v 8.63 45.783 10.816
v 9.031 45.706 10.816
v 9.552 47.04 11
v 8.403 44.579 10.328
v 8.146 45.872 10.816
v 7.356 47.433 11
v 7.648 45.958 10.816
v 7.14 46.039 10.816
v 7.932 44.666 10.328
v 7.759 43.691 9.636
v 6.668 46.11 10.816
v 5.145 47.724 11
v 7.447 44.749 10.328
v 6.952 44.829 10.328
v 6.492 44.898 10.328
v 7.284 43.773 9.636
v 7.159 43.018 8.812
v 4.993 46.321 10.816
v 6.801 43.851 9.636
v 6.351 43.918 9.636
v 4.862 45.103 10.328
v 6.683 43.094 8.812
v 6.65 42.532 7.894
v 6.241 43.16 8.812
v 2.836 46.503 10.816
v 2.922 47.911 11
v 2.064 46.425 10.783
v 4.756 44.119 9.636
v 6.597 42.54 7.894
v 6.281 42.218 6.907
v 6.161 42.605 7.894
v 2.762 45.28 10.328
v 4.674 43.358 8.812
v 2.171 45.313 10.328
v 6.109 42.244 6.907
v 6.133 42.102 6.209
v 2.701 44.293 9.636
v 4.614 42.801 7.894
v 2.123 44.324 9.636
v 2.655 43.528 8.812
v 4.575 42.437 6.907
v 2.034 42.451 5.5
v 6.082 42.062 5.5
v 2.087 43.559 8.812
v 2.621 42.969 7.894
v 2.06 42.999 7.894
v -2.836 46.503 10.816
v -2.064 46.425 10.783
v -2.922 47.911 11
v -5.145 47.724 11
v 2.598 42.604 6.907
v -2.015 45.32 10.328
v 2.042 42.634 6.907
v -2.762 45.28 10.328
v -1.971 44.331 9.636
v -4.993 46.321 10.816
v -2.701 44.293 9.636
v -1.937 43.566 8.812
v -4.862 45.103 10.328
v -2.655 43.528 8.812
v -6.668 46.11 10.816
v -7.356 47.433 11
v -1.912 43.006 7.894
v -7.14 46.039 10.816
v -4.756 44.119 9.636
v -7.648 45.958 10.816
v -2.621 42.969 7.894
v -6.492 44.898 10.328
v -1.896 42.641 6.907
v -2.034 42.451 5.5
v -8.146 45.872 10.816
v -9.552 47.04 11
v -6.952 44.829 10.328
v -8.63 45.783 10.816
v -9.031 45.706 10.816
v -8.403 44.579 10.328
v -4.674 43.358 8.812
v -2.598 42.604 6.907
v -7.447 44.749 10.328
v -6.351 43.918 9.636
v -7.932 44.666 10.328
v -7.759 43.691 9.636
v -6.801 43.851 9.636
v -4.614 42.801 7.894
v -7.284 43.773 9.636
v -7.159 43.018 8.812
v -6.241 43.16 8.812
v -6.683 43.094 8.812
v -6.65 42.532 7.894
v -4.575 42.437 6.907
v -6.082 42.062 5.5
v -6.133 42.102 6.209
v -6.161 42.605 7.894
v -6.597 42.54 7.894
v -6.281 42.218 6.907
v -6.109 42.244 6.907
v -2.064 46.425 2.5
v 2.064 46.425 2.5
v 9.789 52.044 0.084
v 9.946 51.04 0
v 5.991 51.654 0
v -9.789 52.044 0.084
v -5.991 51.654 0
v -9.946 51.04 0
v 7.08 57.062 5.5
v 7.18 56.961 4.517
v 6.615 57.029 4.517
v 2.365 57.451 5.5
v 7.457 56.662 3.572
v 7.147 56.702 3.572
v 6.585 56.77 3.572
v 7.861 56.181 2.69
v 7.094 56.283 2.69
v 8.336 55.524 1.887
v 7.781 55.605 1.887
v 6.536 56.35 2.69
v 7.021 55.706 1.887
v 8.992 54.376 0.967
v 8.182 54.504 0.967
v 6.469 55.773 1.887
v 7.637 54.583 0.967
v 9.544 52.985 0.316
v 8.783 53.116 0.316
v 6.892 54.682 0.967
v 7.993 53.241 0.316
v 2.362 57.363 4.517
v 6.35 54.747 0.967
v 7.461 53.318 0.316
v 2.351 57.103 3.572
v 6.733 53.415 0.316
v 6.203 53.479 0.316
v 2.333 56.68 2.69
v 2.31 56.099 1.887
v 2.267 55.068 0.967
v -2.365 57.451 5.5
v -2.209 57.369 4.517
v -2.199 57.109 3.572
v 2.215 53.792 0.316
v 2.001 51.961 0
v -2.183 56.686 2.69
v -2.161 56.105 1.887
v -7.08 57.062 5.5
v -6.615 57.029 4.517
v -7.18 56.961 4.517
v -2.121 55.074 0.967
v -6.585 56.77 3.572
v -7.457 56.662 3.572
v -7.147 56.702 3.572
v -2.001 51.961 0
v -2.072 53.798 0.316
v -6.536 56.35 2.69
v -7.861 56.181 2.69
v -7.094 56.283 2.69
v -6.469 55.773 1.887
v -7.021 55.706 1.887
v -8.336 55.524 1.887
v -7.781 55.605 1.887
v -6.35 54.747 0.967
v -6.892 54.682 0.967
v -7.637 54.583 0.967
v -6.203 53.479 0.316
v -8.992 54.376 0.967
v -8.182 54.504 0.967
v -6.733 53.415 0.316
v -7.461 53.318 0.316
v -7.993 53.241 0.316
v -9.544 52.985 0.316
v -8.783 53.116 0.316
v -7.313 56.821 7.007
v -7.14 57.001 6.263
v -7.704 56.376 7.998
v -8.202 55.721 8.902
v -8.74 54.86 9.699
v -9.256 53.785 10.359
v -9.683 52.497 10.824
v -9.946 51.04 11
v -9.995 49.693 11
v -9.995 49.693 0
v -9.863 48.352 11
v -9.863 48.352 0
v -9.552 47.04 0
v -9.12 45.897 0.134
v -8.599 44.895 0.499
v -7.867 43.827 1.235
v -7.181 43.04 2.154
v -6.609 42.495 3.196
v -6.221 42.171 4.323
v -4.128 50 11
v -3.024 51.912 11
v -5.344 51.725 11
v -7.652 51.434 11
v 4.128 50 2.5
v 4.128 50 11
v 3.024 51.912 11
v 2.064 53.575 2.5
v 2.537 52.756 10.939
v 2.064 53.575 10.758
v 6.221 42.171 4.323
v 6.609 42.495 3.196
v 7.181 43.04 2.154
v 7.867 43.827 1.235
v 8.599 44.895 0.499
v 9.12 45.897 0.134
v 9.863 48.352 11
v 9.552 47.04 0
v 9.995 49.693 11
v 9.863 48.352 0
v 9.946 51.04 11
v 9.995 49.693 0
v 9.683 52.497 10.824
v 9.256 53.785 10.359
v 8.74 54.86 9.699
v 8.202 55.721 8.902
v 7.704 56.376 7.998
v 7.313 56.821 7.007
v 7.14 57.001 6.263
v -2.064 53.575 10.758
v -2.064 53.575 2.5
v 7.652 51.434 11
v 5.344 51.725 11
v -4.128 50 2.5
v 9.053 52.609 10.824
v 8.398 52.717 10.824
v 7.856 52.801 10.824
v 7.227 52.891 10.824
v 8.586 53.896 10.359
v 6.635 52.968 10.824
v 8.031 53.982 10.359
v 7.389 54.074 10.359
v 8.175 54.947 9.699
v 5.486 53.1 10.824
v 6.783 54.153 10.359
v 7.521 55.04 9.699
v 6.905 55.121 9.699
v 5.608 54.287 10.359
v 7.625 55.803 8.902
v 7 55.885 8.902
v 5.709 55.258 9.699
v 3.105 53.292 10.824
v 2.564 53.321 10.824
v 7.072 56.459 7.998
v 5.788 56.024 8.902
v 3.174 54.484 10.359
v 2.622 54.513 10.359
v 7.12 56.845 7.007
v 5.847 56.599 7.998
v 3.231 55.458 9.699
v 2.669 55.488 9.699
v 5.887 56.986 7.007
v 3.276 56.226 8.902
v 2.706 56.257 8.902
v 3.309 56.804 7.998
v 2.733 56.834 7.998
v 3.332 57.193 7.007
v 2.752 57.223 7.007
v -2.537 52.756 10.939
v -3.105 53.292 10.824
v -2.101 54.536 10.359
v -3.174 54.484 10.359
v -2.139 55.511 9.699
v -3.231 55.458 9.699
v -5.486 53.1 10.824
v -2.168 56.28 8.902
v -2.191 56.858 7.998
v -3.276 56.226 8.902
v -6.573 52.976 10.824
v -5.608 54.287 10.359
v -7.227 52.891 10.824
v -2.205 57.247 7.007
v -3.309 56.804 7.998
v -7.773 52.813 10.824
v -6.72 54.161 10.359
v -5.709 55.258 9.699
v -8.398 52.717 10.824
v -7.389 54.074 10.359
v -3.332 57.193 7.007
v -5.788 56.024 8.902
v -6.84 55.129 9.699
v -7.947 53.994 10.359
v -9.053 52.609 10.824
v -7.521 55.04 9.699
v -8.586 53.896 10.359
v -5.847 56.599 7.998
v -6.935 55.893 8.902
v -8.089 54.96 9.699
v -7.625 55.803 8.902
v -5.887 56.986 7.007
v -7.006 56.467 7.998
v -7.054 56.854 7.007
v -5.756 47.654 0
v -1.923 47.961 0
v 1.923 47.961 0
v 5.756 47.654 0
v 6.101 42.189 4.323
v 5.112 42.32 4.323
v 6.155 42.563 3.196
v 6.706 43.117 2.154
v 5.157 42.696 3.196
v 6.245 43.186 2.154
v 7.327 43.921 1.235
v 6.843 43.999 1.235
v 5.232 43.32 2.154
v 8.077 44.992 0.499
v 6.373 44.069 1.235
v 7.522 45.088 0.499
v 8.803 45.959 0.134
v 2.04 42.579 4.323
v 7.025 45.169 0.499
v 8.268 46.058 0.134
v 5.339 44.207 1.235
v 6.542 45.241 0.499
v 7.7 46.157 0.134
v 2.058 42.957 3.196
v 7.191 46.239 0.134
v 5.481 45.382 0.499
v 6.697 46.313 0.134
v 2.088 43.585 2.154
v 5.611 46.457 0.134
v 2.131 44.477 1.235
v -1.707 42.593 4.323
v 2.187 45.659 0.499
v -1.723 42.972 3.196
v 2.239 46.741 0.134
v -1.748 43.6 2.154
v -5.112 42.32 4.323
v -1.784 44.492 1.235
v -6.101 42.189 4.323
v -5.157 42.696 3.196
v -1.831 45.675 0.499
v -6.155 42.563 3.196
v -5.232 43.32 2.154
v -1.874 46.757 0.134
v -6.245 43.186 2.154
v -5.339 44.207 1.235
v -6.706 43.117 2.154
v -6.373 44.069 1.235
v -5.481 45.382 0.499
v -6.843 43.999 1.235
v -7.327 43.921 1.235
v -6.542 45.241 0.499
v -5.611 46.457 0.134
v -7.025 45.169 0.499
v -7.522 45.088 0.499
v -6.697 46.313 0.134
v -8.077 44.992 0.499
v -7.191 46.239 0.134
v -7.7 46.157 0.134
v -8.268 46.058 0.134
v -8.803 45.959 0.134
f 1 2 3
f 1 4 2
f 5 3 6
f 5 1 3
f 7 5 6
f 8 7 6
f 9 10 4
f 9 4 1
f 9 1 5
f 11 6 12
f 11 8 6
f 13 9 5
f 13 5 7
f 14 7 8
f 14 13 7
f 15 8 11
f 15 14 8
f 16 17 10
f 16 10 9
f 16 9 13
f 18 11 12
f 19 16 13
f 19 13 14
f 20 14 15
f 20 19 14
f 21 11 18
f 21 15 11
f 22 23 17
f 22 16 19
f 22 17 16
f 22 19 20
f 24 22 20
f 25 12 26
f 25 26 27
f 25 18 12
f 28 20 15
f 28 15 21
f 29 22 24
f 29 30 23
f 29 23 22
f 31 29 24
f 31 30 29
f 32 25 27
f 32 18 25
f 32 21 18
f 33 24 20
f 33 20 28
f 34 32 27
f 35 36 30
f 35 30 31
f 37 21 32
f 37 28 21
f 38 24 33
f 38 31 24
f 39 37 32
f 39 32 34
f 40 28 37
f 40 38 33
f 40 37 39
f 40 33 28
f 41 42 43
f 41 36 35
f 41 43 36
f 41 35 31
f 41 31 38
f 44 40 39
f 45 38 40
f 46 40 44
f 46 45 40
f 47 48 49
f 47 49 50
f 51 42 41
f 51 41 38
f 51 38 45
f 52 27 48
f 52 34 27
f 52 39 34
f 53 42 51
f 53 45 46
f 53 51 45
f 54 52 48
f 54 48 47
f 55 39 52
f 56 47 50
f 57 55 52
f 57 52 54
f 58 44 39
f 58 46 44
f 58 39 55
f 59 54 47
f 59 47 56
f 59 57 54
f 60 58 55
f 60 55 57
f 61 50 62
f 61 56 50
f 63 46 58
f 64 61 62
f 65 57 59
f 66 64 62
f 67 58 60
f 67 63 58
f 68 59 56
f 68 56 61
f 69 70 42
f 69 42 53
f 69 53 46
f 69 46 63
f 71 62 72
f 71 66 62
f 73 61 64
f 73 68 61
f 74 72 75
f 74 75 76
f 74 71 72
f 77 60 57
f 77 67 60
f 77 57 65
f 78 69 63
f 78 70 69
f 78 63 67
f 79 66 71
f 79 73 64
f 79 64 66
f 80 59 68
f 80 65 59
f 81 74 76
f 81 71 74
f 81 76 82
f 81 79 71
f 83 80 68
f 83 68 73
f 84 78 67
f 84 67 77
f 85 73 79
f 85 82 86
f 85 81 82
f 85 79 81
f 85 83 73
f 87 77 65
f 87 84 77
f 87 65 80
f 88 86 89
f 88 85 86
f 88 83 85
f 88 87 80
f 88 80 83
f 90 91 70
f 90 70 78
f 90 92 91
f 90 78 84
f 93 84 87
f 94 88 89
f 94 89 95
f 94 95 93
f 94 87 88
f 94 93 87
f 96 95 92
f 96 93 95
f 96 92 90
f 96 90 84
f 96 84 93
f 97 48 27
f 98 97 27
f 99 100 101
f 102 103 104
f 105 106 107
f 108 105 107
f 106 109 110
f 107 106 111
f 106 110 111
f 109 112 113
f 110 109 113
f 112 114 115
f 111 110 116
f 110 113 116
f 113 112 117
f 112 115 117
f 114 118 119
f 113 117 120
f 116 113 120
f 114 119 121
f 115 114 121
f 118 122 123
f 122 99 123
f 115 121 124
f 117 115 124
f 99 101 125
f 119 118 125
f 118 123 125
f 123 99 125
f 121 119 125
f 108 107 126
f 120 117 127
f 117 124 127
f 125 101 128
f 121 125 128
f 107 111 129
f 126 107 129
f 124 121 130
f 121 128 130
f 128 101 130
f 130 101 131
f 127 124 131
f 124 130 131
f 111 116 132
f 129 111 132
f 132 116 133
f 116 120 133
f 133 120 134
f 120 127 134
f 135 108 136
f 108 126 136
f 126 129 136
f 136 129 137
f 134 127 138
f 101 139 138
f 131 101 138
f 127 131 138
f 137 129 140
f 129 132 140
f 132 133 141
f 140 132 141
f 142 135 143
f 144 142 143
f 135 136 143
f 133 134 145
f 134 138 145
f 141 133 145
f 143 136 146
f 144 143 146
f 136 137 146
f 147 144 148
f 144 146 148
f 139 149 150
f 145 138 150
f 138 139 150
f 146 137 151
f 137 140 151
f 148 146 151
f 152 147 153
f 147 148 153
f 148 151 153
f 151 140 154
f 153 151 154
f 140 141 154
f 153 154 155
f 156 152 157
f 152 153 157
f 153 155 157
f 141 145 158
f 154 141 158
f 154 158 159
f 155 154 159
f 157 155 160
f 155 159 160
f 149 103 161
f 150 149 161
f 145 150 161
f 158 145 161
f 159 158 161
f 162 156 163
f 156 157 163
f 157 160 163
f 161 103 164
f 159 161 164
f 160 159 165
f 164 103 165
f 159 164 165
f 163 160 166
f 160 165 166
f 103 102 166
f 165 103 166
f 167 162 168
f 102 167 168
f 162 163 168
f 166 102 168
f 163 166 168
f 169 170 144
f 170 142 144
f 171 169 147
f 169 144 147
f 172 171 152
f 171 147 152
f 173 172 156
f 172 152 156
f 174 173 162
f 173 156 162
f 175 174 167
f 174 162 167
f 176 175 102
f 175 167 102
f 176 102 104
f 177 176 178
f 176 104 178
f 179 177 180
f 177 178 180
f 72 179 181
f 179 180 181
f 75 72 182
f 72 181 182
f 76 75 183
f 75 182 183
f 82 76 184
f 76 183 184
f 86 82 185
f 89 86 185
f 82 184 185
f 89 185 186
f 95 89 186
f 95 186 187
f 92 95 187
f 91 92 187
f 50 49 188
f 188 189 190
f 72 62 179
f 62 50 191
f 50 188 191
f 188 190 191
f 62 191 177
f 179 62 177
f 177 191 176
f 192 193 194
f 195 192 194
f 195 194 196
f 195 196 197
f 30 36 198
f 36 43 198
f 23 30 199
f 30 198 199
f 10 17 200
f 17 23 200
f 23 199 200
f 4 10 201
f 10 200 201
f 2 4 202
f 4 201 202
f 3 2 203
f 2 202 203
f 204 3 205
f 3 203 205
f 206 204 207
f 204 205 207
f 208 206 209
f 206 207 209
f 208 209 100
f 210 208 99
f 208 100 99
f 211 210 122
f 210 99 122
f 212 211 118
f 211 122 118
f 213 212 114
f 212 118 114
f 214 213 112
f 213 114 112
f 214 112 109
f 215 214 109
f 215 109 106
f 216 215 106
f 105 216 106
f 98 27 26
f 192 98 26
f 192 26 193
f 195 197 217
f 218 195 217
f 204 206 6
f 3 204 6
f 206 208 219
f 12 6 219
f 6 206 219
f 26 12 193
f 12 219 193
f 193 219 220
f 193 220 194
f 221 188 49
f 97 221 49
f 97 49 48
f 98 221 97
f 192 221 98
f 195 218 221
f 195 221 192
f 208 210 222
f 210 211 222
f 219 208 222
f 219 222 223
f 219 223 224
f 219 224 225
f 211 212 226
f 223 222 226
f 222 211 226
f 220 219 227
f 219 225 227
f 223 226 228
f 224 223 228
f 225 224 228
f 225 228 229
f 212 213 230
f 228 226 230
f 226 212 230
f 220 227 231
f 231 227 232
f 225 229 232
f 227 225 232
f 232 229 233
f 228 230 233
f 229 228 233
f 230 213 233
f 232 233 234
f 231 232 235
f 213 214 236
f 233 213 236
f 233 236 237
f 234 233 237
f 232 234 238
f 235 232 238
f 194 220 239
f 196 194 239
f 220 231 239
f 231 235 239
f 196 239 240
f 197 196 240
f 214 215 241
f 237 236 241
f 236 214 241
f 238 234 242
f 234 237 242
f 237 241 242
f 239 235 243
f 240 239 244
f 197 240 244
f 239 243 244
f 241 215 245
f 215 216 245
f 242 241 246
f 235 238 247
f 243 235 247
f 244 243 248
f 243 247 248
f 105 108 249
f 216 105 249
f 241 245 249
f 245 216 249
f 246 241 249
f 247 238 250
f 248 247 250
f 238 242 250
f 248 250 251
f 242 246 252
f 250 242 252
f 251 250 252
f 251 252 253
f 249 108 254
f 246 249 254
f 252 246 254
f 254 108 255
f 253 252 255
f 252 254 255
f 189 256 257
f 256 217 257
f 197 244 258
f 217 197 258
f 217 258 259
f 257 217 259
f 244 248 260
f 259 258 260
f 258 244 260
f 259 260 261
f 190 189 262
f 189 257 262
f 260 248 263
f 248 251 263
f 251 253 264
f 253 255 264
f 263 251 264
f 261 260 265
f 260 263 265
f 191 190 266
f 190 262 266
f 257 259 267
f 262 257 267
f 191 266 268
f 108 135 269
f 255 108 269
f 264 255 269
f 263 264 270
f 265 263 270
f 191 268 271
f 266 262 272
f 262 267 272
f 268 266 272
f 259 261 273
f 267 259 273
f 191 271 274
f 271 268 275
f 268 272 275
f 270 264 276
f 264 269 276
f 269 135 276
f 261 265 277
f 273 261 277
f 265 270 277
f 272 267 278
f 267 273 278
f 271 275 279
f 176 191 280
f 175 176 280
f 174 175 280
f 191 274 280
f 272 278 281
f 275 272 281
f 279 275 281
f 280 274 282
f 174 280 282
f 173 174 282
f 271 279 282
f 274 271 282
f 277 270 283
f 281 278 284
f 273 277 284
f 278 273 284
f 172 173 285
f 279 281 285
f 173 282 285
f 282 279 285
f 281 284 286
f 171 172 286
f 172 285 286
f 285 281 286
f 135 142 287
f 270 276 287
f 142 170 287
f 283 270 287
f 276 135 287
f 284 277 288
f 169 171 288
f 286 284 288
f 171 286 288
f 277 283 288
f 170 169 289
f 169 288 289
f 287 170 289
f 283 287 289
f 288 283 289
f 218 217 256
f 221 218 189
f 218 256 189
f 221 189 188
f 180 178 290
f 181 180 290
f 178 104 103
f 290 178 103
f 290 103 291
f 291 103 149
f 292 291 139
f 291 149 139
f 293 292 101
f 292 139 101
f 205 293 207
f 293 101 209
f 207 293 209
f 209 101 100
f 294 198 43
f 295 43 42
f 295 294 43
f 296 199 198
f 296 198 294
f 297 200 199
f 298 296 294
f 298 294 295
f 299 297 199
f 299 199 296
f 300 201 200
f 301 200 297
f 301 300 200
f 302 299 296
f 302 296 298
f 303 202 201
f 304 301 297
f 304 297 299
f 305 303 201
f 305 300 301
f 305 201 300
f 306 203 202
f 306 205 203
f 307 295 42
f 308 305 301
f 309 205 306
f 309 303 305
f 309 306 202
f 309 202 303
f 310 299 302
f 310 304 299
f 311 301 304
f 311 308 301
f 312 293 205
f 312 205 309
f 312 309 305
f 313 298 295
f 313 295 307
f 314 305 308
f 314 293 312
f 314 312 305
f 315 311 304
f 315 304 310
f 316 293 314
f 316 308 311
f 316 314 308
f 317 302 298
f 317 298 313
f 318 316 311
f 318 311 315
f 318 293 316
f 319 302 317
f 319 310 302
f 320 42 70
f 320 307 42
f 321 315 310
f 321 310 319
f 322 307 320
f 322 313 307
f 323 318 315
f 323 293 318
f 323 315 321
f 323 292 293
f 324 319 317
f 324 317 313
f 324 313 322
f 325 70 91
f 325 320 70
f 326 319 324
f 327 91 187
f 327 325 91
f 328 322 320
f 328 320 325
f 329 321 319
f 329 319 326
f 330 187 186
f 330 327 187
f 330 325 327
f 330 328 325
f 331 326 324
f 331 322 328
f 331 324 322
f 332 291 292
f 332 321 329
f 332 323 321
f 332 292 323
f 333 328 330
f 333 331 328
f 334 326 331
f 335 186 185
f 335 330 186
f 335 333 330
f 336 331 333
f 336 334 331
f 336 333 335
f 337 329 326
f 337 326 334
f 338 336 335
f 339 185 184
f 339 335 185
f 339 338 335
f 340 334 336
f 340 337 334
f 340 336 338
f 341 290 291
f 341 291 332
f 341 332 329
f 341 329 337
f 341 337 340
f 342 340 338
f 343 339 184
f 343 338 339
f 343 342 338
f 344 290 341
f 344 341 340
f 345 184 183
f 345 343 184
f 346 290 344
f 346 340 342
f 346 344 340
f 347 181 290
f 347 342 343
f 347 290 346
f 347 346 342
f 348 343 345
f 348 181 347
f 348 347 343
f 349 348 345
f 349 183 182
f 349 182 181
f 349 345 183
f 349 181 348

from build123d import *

# Parameters (mm, degrees)
F0_W     = 15
F0_H     = 11
F3_DEPTH = 8.5
F5_R     = 10
F6_DEPTH = 25


# Not quite as in the source:
# - a fillet or chamfer that OpenCascade refuses, or shapes differently, is made with other operations: its cross-section is extruded or revolved along the edge and cut away or added


with BuildPart() as f1:
    # F0 (on Front) → F1 (revolve)
    with BuildSketch(Plane.XZ):
        with Locations((50, 5.5)):
            Rectangle(F0_W, F0_H)
    revolve(axis=Axis((0, 0, 11.3872010261), (0, 0, 1)))

    # F2 (on face) → F3 (cut)
    with BuildSketch(Plane.XY.offset(11)):
        Polygon((-2.0640272124, 46.425), (2.0640272124, 46.425), (4.1280544247, 50), (2.0640272124, 53.575), (-2.0640272124, 53.575), (-4.1280544247, 50), align=None)
        Polygon((-15.8591658515, 43.680976315), (-15.3203466262, 47.7737146618), (-18.5953523929, 50.2867149724), (-22.409177385, 48.7069769362), (-22.9479966103, 44.6142385893), (-19.6729908436, 42.1012382787), align=None)
        Polygon((-31.3679446782, 34.286919955), (-32.4363637825, 38.2743143361), (-36.4237581637, 39.3427334405), (-39.3427334405, 36.4237581637), (-38.2743143361, 32.4363637825), (-34.286919955, 31.3679446782), align=None)
        Polygon((-42.1012382787, 19.6729908436), (-44.6142385893, 22.9479966103), (-48.7069769362, 22.409177385), (-50.2867149724, 18.5953523929), (-47.7737146618, 15.3203466262), (-43.680976315, 15.8591658515), align=None)
        Polygon((-46.425, 2.0640272124), (-50, 4.1280544247), (-53.575, 2.0640272124), (-53.575, -2.0640272124), (-50, -4.1280544247), (-46.425, -2.0640272124), align=None)
        Polygon((-43.680976315, -15.8591658515), (-47.7737146618, -15.3203466262), (-50.2867149724, -18.5953523929), (-48.7069769362, -22.409177385), (-44.6142385893, -22.9479966103), (-42.1012382787, -19.6729908436), align=None)
        Polygon((-34.286919955, -31.3679446782), (-38.2743143361, -32.4363637825), (-39.3427334405, -36.4237581637), (-36.4237581637, -39.3427334405), (-32.4363637825, -38.2743143361), (-31.3679446782, -34.286919955), align=None)
        Polygon((-19.6729908436, -42.1012382787), (-22.9479966103, -44.6142385893), (-22.409177385, -48.7069769362), (-18.5953523929, -50.2867149724), (-15.3203466262, -47.7737146618), (-15.8591658515, -43.680976315), align=None)
        Polygon((-2.0640272124, -46.425), (-4.1280544247, -50), (-2.0640272124, -53.575), (2.0640272124, -53.575), (4.1280544247, -50), (2.0640272124, -46.425), align=None)
        Polygon((15.8591658515, -43.680976315), (15.3203466262, -47.7737146618), (18.5953523929, -50.2867149724), (22.409177385, -48.7069769362), (22.9479966103, -44.6142385893), (19.6729908436, -42.1012382787), align=None)
        Polygon((31.3679446782, -34.286919955), (32.4363637825, -38.2743143361), (36.4237581637, -39.3427334405), (39.3427334405, -36.4237581637), (38.2743143361, -32.4363637825), (34.286919955, -31.3679446782), align=None)
        Polygon((42.1012382787, -19.6729908436), (44.6142385893, -22.9479966103), (48.7069769362, -22.409177385), (50.2867149724, -18.5953523929), (47.7737146618, -15.3203466262), (43.680976315, -15.8591658515), align=None)
        Polygon((46.425, -2.0640272124), (50, -4.1280544247), (53.575, -2.0640272124), (53.575, 2.0640272124), (50, 4.1280544247), (46.425, 2.0640272124), align=None)
        Polygon((43.680976315, 15.8591658515), (47.7737146618, 15.3203466262), (50.2867149724, 18.5953523929), (48.7069769362, 22.409177385), (44.6142385893, 22.9479966103), (42.1012382787, 19.6729908436), align=None)
        Polygon((34.286919955, 31.3679446782), (38.2743143361, 32.4363637825), (39.3427334405, 36.4237581637), (36.4237581637, 39.3427334405), (32.4363637825, 38.2743143361), (31.3679446782, 34.286919955), align=None)
        Polygon((19.6729908436, 42.1012382787), (22.9479966103, 44.6142385893), (22.409177385, 48.7069769362), (18.5953523929, 50.2867149724), (15.3203466262, 47.7737146618), (15.8591658515, 43.680976315), align=None)
    extrude(amount=-F3_DEPTH, mode=Mode.SUBTRACT)

    # F4: fillet of radius 5.5 on 4 edges, made by hand

    # F4_s1 → F4_t2 (revolve, cut)
    with BuildSketch(Plane.XZ):
        with BuildLine():
            ThreePointArc((48, 11), (44.1109127035, 9.3890872965), (42.5, 5.5))
            Line((42.5, 5.5), (42.5, 11))
            Line((42.5, 11), (48, 11))
        make_face()
    revolve(axis=Axis((0, 0, 11), (0, 0, 1)), mode=Mode.SUBTRACT)

    # F4_s3 → F4_t4 (revolve, cut)
    with BuildSketch(Plane.XZ):
        with BuildLine():
            ThreePointArc((52, 11), (55.8890872965, 9.3890872965), (57.5, 5.5))
            Line((57.5, 5.5), (57.5, 11))
            Line((57.5, 11), (52, 11))
        make_face()
    revolve(axis=Axis((0, 0, 11), (0, 0, 1)), mode=Mode.SUBTRACT)

    # F4_s5 → F4_t6 (revolve, cut)
    with BuildSketch(Plane.XZ):
        with BuildLine():
            ThreePointArc((57.5, 5.5), (55.8890872965, 1.6109127035), (52, 0))
            Line((52, 0), (57.5, 0))
            Line((57.5, 0), (57.5, 5.5))
        make_face()
    revolve(axis=Axis((0, 0, 0), (0, 0, 1)), mode=Mode.SUBTRACT)

    # F4_s7 → F4_t8 (revolve, cut)
    with BuildSketch(Plane.XZ):
        with BuildLine():
            ThreePointArc((42.5, 5.5), (44.1109127035, 1.6109127035), (48, 0))
            Line((48, 0), (42.5, 0))
            Line((42.5, 0), (42.5, 5.5))
        make_face()
    revolve(axis=Axis((0, 0, 0), (0, 0, 1)), mode=Mode.SUBTRACT)


with BuildPart() as f6:
    # F5 (on Top) → F6 (new body)
    with BuildSketch(Plane.XY):
        with Locations((0, 50)):
            Circle(F5_R)
    extrude(amount=F6_DEPTH)

    # F7: intersect F1
    add(f1.part, mode=Mode.INTERSECT)


solid = f6.part
